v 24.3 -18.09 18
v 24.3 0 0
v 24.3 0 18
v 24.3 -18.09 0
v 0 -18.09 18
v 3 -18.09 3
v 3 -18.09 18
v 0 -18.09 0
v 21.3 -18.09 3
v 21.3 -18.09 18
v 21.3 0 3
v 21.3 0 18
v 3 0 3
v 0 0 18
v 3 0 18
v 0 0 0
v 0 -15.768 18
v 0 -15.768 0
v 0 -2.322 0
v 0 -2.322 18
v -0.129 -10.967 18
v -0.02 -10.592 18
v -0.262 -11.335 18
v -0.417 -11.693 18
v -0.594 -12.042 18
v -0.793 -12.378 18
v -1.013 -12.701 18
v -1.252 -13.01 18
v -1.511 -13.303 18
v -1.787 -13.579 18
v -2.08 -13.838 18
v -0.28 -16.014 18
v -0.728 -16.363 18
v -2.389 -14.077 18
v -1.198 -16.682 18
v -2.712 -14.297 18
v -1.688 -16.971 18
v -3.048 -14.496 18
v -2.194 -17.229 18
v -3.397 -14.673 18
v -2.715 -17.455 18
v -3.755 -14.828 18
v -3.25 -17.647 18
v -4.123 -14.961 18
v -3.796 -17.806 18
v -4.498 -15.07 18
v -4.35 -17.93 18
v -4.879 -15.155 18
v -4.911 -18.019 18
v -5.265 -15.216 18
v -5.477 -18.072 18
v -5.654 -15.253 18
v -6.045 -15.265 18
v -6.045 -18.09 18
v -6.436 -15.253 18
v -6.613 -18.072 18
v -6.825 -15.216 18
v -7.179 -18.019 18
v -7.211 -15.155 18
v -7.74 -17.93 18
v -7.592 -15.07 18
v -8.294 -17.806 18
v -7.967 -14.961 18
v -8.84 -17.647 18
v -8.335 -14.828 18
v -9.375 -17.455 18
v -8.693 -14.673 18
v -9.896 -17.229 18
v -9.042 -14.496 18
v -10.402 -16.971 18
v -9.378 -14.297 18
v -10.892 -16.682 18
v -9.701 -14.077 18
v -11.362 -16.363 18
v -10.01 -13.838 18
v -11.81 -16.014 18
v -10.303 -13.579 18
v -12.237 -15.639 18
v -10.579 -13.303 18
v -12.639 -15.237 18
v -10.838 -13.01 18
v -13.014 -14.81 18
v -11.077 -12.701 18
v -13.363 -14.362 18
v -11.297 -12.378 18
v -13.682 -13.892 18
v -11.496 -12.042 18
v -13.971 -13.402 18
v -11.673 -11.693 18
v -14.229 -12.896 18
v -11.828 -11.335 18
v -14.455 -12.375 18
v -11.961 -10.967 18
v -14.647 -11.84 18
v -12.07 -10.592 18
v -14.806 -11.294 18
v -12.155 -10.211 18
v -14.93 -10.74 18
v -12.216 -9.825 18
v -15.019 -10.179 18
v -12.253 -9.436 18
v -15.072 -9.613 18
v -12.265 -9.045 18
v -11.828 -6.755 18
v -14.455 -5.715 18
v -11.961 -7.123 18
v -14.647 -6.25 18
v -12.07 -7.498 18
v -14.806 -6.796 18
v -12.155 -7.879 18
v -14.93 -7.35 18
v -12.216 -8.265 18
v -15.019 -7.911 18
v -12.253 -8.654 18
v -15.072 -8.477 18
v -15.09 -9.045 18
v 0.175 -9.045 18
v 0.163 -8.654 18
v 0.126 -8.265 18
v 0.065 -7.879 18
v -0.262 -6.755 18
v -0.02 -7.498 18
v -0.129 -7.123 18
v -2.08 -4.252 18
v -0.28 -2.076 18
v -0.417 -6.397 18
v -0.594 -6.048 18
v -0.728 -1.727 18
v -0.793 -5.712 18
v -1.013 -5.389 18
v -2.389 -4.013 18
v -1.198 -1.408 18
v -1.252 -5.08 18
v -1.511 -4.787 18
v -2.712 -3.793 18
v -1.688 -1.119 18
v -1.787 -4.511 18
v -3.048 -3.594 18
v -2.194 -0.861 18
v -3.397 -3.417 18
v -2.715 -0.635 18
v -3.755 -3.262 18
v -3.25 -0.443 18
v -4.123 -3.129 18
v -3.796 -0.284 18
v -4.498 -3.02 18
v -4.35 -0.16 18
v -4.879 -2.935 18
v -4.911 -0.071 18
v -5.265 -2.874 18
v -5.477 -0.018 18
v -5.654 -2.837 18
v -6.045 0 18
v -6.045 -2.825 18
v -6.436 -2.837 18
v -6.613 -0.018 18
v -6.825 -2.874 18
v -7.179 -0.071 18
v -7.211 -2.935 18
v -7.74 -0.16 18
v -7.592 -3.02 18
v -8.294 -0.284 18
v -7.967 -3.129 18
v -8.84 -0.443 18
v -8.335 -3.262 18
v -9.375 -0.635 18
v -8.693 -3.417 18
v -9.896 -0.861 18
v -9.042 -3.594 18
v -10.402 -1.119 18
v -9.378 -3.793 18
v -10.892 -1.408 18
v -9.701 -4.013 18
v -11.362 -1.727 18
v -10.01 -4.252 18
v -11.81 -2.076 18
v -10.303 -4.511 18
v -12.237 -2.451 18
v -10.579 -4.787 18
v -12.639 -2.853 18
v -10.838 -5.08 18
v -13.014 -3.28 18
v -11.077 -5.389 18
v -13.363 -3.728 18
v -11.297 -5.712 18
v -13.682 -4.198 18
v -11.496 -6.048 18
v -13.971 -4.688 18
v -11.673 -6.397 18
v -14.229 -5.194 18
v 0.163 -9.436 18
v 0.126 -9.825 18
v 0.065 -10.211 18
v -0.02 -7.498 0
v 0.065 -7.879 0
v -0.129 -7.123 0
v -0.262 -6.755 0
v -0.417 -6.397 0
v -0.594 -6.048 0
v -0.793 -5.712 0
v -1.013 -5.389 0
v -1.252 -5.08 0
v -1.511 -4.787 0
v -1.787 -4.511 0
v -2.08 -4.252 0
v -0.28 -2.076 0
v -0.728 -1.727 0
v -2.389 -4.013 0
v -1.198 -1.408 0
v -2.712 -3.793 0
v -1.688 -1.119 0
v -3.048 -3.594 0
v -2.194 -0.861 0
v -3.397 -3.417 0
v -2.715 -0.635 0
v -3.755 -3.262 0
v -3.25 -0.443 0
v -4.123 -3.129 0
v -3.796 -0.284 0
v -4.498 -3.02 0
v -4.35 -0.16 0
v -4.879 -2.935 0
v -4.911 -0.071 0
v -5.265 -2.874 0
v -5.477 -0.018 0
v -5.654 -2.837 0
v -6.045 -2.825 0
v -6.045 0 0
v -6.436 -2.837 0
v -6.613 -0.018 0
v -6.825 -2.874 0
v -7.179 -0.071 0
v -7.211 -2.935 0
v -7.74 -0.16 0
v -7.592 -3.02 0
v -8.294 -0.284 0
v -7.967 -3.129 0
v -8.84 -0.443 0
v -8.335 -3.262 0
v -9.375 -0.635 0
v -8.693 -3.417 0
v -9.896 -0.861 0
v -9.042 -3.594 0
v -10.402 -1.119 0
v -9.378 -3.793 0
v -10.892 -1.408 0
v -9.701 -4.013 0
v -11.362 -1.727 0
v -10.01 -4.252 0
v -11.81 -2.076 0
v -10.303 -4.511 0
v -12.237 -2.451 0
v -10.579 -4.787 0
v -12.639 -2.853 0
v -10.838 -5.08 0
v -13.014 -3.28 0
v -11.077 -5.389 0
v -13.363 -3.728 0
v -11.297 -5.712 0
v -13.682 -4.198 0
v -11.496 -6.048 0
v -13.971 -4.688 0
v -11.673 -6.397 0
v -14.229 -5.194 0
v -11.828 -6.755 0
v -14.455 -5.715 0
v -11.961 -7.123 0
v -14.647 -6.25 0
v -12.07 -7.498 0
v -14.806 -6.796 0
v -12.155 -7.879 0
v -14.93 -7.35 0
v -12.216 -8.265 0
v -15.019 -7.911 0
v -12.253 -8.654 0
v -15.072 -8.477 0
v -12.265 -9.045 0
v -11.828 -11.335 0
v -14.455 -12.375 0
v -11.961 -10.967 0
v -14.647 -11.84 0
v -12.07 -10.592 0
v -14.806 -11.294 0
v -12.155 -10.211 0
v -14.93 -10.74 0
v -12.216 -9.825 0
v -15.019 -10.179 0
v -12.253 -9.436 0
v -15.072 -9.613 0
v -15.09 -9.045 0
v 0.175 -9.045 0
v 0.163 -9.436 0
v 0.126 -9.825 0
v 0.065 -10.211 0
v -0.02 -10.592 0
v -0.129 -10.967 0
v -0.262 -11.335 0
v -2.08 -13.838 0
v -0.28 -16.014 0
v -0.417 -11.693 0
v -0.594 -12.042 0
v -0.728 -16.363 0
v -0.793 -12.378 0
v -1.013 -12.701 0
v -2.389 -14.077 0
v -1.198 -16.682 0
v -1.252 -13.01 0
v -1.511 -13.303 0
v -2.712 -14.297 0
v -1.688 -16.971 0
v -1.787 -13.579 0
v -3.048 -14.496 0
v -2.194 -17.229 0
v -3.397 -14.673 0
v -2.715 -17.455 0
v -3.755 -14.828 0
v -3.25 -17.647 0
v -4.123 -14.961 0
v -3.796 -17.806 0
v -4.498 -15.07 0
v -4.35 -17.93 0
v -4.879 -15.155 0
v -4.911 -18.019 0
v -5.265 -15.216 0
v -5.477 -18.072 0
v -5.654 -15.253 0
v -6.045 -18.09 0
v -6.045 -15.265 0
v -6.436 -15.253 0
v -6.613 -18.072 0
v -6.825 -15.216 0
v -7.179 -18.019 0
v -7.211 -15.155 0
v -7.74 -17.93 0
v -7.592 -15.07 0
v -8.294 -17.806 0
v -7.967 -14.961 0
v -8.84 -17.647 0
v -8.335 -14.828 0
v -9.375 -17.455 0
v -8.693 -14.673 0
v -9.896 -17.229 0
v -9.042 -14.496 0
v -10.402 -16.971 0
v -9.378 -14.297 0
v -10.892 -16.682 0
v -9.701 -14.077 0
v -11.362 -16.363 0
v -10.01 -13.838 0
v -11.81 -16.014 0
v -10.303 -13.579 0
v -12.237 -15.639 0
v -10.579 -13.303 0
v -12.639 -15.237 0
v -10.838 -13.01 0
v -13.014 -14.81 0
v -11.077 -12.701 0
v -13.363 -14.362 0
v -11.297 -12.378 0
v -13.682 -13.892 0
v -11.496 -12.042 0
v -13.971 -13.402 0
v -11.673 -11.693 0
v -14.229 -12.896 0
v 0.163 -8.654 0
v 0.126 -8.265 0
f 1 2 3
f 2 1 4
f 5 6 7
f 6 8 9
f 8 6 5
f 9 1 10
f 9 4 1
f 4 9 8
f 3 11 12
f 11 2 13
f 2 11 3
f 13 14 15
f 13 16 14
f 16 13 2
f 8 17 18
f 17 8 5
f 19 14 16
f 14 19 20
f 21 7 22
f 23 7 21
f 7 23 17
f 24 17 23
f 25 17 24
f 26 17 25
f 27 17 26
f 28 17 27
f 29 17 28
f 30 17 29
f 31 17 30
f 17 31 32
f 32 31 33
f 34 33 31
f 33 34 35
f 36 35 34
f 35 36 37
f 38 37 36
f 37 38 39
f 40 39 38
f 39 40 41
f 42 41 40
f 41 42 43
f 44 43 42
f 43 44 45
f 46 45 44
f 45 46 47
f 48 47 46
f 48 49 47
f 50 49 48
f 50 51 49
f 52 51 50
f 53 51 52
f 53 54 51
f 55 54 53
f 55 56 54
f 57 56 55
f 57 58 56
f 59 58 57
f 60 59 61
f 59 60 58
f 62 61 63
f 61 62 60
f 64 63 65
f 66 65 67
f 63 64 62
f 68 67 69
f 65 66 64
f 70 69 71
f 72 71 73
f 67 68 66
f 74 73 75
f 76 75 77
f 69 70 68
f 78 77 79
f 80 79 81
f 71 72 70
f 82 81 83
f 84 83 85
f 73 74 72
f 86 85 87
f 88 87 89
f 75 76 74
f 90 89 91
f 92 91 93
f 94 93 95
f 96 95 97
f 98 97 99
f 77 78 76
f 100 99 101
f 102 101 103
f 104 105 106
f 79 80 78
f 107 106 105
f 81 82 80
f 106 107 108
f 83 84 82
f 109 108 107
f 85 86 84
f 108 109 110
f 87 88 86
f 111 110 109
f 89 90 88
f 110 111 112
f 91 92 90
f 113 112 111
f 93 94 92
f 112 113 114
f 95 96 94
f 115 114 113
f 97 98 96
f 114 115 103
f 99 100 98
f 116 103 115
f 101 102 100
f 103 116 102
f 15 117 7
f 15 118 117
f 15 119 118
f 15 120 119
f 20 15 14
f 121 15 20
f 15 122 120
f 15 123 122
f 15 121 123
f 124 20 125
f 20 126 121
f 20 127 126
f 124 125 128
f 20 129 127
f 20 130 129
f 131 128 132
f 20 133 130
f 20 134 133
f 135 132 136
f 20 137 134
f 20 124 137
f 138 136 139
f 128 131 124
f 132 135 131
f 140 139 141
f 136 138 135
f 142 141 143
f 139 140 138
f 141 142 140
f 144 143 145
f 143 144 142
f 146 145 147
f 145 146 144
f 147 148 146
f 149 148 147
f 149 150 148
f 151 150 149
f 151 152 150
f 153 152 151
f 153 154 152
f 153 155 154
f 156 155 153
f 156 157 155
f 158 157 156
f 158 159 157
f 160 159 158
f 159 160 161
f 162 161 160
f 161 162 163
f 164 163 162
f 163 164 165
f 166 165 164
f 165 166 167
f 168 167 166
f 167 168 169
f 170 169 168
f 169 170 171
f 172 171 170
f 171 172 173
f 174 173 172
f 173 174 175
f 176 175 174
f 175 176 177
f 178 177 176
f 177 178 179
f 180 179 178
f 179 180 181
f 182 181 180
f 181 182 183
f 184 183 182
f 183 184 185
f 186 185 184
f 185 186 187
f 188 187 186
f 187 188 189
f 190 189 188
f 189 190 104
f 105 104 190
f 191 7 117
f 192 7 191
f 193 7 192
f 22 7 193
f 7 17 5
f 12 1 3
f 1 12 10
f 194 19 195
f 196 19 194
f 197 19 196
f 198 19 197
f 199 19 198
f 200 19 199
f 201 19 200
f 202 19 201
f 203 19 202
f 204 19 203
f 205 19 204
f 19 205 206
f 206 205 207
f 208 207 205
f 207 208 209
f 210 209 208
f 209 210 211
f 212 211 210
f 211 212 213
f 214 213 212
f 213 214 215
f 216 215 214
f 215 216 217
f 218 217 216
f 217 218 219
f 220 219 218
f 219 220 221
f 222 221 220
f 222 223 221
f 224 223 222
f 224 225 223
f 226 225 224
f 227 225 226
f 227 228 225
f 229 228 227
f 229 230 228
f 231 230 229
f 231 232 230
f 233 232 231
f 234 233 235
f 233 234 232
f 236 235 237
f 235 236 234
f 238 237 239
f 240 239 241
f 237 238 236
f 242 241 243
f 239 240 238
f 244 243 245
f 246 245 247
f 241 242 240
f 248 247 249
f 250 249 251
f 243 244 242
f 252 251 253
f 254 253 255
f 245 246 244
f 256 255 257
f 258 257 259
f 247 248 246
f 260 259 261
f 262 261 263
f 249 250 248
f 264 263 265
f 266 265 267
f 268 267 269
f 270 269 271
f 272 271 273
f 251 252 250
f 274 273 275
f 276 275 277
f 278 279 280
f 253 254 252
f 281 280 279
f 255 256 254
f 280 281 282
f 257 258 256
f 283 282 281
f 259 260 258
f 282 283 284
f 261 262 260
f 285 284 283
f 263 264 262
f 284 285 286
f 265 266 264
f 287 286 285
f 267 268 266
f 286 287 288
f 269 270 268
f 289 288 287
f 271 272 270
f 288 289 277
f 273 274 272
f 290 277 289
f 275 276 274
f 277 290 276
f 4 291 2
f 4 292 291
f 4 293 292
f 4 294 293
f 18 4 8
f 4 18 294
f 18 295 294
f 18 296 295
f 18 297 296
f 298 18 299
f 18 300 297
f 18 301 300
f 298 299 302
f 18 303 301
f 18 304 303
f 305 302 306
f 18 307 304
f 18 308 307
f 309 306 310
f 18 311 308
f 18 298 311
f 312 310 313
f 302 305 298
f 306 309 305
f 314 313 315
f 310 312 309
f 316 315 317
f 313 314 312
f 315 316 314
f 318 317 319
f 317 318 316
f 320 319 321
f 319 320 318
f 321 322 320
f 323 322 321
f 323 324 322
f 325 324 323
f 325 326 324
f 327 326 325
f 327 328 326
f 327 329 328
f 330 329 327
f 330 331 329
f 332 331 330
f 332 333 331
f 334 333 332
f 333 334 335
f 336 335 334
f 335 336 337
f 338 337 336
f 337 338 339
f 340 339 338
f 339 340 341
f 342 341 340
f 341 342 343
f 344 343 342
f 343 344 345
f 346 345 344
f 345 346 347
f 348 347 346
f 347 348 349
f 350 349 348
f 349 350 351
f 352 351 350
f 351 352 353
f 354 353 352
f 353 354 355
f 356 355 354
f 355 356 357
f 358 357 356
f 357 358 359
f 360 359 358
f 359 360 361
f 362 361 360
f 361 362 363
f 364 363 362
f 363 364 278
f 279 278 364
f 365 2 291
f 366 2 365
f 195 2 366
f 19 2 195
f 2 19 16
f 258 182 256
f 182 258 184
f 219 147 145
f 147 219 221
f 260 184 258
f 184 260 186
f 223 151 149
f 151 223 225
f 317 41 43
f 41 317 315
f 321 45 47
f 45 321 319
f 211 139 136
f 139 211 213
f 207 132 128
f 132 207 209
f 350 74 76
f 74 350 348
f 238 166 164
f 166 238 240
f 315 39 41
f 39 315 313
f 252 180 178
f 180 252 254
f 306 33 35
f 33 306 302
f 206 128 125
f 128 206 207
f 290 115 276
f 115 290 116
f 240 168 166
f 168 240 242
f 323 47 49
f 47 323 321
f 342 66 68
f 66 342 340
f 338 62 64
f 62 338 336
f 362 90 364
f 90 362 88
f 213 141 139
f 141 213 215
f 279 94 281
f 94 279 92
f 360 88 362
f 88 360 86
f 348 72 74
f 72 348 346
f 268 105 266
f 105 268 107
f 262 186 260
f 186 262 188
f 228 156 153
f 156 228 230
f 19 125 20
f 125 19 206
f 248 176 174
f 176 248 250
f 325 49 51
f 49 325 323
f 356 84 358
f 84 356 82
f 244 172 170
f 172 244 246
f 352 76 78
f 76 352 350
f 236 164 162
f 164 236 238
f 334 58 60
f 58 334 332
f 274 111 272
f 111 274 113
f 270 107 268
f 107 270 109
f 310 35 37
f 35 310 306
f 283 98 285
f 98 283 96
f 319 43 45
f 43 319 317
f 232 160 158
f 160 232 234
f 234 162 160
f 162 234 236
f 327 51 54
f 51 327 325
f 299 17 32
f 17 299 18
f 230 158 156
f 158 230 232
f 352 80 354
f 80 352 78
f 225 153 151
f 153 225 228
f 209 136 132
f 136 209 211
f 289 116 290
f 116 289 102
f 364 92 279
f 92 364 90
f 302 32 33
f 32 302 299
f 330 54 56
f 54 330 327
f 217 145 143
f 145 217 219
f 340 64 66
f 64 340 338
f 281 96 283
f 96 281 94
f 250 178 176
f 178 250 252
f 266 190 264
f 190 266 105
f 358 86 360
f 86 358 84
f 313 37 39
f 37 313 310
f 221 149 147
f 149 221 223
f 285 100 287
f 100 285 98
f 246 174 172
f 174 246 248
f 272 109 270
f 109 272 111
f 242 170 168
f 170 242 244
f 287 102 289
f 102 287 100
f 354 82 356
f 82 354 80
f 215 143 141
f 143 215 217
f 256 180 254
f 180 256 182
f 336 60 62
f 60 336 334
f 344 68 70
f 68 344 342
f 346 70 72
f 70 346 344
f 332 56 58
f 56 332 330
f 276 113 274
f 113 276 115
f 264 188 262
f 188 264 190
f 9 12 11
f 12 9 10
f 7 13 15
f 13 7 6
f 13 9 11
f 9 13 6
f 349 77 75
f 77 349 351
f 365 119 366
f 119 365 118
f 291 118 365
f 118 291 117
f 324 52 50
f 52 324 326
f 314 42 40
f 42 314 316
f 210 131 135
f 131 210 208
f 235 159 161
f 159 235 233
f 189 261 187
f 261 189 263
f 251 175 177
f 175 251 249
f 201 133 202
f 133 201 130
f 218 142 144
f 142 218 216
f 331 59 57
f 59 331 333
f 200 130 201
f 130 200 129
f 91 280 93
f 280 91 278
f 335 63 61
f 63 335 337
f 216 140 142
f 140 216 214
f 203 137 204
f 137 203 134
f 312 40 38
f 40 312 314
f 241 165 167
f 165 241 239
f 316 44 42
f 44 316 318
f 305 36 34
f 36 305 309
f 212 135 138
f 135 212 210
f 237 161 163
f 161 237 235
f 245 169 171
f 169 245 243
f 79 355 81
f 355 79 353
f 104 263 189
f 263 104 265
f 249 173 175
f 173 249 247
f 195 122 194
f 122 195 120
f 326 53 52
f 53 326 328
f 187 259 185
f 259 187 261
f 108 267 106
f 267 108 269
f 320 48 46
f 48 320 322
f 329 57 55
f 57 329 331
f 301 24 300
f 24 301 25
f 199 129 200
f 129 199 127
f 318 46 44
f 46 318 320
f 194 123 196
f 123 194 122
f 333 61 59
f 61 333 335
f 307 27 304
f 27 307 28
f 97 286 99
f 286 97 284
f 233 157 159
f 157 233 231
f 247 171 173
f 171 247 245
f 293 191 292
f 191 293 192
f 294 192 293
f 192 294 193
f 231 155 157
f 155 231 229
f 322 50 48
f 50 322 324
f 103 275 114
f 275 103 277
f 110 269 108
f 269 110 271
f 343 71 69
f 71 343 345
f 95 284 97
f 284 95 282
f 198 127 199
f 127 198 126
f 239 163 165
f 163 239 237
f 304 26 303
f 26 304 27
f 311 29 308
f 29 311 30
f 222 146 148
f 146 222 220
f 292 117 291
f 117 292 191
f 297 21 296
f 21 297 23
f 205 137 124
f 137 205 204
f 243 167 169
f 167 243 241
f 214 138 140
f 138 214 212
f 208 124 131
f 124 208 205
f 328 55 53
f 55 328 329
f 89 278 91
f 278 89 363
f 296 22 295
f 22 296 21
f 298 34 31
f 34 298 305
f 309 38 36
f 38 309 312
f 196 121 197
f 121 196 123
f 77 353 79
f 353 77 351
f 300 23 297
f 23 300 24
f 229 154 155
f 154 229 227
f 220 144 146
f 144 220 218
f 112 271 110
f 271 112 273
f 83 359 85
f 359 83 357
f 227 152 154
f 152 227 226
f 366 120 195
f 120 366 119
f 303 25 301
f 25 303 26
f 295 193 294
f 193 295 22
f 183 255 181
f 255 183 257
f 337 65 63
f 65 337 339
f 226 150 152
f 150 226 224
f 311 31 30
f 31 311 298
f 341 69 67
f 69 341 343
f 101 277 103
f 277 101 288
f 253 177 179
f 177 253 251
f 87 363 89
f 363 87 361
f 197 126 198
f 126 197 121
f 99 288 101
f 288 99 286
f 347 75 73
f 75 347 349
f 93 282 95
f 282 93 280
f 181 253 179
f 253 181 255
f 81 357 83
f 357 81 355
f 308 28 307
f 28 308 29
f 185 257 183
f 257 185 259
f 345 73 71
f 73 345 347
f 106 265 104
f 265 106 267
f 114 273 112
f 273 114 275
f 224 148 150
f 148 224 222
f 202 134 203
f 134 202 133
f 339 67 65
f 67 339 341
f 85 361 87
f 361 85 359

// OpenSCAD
$fn = 100;

nozzleRadius = 0.35 / 2;
play = nozzleRadius;

plateThickness = 18.3;
mountLength = 15;
wallThickness = 3;
laserRadius = 12.09 / 2;

height = 2 * wallThickness + 2 * laserRadius;
width = 2 * wallThickness + plateThickness;
length = wallThickness + mountLength;

laserMount();

module laserMount()
{
    rotate([90, 0, 0])  //  Rotate the design to the most favourable orientation for FDM
    {
        difference()
        {
            union()
            {
                cube([width, length, height]);  //  Start with the base for the mount
                translate([-laserRadius, 0, wallThickness + laserRadius])
                {
                    rotate([-90, 0, 0])
                    {
                        cylinder(r = laserRadius + wallThickness, h = length);  //  Base for the laser mount
                    }
                }
            }
            translate([wallThickness, wallThickness, -0.1])
            {
                cube([plateThickness, mountLength + 0.1, height + 0.2]); // Cut out the shape of the plate the design is attached to
            }
            translate([-laserRadius, 0, wallThickness + laserRadius])
            {
                rotate([-90, 0, 0])
                {
                    translate([0, 0, -0.1])
                    {
                        cylinder(r = laserRadius + play, h = length + 0.2);   //  Cut out the shape of the laser with a little play to provide a nice fit
                    }
                }
            }
        }
    }
}
